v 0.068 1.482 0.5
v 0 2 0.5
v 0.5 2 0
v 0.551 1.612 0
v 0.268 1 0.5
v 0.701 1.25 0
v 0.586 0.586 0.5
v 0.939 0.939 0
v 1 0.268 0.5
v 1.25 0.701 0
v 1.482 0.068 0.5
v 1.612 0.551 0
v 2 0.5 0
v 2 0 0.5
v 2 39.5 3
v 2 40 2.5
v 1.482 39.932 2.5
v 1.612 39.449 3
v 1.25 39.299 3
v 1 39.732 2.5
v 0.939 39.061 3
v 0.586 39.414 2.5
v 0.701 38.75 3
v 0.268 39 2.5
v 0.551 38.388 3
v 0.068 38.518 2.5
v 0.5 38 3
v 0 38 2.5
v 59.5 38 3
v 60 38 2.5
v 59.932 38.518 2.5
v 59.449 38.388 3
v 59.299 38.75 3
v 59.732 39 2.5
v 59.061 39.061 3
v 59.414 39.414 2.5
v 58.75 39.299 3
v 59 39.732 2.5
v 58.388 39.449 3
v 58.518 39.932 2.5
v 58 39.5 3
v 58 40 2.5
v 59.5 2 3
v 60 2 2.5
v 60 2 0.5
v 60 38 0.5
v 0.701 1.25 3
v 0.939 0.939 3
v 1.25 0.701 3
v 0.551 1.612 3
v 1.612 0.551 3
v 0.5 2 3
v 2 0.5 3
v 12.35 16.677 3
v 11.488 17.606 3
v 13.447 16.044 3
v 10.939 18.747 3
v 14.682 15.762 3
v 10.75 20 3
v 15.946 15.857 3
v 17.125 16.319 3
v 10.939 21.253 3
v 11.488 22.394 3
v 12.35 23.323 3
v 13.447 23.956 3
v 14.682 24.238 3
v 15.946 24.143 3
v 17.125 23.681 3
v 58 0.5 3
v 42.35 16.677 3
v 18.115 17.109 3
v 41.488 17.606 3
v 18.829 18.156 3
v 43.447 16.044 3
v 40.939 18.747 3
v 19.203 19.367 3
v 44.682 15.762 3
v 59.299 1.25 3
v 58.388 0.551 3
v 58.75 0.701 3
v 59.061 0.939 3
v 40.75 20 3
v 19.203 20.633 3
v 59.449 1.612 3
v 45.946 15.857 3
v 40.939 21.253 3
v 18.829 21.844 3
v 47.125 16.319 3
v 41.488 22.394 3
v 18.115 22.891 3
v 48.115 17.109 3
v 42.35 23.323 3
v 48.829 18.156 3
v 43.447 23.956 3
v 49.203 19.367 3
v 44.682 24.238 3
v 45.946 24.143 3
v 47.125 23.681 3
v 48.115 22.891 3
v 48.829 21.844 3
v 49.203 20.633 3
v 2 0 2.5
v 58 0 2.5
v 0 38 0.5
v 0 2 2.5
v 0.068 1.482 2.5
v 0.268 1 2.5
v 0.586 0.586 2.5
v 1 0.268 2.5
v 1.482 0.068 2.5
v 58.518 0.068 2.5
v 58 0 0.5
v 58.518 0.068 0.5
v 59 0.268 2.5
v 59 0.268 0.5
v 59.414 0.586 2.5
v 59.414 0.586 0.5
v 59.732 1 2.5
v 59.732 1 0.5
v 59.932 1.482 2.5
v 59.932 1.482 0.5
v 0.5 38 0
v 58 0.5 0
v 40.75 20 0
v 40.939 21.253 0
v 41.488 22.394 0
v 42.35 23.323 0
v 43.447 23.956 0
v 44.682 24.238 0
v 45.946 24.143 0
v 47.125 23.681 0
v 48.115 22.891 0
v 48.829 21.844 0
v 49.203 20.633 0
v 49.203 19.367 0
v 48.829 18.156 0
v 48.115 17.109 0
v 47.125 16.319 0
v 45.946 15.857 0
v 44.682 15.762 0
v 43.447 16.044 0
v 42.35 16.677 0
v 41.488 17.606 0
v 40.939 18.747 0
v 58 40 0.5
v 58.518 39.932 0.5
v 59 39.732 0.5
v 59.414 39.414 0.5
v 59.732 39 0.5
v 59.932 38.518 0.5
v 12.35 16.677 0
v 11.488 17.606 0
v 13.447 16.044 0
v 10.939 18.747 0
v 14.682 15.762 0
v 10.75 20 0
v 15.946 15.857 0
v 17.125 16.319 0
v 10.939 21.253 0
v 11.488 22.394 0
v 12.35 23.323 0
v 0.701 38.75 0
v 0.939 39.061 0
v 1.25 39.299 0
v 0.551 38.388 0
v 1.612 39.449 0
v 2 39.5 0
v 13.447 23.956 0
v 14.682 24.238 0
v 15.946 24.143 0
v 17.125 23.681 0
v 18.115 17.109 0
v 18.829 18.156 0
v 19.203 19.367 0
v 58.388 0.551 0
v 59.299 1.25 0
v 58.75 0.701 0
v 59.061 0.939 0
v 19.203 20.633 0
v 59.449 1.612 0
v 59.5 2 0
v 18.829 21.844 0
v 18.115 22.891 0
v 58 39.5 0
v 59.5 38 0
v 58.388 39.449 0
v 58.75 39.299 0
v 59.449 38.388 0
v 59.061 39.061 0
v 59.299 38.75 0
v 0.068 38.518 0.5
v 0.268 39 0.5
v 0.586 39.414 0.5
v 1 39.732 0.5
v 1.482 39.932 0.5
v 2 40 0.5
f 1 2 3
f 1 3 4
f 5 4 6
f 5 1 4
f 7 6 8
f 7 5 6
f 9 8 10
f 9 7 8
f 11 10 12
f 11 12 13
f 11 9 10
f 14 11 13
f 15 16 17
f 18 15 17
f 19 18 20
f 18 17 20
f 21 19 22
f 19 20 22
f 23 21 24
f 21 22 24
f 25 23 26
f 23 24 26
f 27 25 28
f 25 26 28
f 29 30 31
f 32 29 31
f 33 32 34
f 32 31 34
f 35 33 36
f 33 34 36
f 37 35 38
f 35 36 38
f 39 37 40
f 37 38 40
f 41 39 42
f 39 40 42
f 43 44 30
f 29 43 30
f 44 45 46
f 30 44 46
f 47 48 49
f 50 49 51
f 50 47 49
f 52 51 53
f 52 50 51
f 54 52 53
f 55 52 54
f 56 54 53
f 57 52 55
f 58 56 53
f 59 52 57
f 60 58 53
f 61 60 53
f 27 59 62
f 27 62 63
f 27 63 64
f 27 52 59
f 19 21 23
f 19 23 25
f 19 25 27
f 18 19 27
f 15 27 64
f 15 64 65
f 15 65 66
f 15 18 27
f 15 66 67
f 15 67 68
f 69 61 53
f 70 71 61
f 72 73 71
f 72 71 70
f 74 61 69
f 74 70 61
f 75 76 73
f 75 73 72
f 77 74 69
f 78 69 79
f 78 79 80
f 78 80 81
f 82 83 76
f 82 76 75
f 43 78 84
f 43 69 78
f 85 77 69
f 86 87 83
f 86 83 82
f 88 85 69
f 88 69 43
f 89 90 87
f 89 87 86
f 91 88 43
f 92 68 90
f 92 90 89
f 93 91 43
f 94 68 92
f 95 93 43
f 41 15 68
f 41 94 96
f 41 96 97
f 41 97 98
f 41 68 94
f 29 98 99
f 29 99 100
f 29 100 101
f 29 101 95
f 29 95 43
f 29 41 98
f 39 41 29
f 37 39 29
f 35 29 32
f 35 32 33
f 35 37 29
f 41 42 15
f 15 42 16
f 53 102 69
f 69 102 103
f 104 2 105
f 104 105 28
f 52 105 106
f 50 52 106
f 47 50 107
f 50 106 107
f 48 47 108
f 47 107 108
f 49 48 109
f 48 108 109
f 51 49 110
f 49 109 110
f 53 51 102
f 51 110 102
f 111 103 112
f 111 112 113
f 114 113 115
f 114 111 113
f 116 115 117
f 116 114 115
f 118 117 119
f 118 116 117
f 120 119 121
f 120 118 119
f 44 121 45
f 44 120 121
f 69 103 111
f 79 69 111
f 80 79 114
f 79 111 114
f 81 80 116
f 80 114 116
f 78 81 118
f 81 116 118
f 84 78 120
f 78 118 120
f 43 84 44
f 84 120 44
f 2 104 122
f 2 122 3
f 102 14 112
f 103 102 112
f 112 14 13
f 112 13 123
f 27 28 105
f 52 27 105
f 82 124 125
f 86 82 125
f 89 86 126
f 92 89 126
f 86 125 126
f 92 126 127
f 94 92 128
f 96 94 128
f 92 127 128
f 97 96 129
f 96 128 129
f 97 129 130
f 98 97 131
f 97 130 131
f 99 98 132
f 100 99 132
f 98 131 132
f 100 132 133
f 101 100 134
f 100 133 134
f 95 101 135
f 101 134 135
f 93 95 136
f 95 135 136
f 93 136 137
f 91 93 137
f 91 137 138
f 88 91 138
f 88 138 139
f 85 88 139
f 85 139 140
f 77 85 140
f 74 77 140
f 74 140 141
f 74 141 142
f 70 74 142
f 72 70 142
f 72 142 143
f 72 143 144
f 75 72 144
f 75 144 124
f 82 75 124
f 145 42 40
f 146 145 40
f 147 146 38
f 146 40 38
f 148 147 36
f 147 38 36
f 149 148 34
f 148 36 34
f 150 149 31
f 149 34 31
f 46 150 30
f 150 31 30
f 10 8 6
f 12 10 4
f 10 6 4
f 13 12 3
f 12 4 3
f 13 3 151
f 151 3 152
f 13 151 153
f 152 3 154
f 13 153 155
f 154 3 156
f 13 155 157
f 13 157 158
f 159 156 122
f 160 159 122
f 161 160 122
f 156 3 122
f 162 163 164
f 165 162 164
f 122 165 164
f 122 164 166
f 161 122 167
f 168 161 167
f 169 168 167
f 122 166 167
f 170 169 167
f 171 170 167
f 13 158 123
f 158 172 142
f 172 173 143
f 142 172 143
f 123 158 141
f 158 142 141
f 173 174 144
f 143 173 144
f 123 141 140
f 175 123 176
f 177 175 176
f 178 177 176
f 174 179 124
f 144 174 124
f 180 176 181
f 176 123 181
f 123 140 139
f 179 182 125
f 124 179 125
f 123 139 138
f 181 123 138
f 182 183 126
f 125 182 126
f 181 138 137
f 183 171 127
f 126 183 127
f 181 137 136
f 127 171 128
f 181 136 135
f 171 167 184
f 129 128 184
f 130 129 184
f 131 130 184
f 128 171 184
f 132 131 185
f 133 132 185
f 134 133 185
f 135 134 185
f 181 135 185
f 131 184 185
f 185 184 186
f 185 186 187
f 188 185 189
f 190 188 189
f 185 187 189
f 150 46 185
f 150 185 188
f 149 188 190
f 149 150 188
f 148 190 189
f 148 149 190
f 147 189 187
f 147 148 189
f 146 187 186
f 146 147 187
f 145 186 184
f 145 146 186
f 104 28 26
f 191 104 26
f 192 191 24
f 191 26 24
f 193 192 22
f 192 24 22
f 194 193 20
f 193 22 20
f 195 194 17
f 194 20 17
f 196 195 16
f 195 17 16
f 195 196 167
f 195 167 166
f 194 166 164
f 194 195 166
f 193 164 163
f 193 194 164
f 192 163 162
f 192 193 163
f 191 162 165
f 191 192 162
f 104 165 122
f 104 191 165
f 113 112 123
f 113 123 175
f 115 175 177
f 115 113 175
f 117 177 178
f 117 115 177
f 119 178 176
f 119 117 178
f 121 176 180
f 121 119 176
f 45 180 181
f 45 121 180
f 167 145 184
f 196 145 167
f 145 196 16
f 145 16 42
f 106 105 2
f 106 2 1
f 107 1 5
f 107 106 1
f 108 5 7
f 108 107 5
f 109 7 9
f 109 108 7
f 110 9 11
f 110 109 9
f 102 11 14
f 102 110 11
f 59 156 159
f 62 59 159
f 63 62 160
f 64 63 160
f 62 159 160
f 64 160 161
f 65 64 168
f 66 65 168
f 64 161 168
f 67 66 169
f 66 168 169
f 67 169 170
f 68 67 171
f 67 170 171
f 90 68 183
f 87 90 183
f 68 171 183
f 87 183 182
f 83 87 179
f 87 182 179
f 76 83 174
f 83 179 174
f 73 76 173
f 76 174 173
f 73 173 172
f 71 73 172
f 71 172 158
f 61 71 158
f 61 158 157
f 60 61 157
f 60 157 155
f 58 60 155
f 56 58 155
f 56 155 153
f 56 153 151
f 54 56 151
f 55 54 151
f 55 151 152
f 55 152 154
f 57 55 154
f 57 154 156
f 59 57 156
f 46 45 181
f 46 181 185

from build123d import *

# Parameters (mm, degrees)
SZKIC1_W                    = 60
SZKIC1_H                    = 40
DODANIE_WYCI_GNI_CIE1_DEPTH = 3
OTW_R_GWINTOWANY_M101_D     = 8.5
OTW_R_GWINTOWANY_M101_DEPTH = 27.5
OTW_R_GWINTOWANY_M101_TIP   = 2.553657631
ZAOKR_GLENIE1_R             = 2
SFAZOWANIE1_SIZE            = 0.5


with BuildPart() as part:
    # Szkic1 → Dodanie-wyciągnięcie1 (new body)
    with BuildSketch(Plane.XY):
        with Locations((30, 20)):
            Rectangle(SZKIC1_W, SZKIC1_H)
    extrude(amount=DODANIE_WYCI_GNI_CIE1_DEPTH)

    # Otwór gwintowany M101
    with Locations(Plane.XY.offset(3)):
        with Locations((15, 20), (45, 20)):
            Hole(OTW_R_GWINTOWANY_M101_D / 2, depth=OTW_R_GWINTOWANY_M101_DEPTH)
            with Locations((0, 0, -(OTW_R_GWINTOWANY_M101_DEPTH + OTW_R_GWINTOWANY_M101_TIP / 2))):  # 118° drill point
                Cone(0, OTW_R_GWINTOWANY_M101_D / 2, OTW_R_GWINTOWANY_M101_TIP, mode=Mode.SUBTRACT)

    # Zaokrąglenie1
    zaokr_glenie1_edges = [part.edges().sort_by_distance(p)[0] for p in [
        (0, 40, 1.5),
        (60, 40, 1.5),
        (60, 0, 1.5),
        (0, 0, 1.5),
    ]]
    fillet(zaokr_glenie1_edges, radius=ZAOKR_GLENIE1_R)

    # Sfazowanie1
    sfazowanie1_edges = [part.edges().sort_by_distance(p)[0] for p in [
        (60, 20, 0),
        (60, 20, 3),
        (0, 20, 0),
        (30, 40, 0),
        (30, 0, 0),
        (59.414213562, 39.414213562, 0),
        (0.585786438, 39.414213562, 0),
        (0.585786438, 0.585786438, 0),
        (59.414213562, 0.585786438, 0),
        (30, 0, 3),
        (0, 20, 3),
        (30, 40, 3),
        (59.414213562, 39.414213562, 3),
        (0.585786438, 39.414213562, 3),
        (0.585786438, 0.585786438, 3),
        (59.414213562, 0.585786438, 3),
    ]]
    chamfer(sfazowanie1_edges, length=SFAZOWANIE1_SIZE)


solid = part.part
